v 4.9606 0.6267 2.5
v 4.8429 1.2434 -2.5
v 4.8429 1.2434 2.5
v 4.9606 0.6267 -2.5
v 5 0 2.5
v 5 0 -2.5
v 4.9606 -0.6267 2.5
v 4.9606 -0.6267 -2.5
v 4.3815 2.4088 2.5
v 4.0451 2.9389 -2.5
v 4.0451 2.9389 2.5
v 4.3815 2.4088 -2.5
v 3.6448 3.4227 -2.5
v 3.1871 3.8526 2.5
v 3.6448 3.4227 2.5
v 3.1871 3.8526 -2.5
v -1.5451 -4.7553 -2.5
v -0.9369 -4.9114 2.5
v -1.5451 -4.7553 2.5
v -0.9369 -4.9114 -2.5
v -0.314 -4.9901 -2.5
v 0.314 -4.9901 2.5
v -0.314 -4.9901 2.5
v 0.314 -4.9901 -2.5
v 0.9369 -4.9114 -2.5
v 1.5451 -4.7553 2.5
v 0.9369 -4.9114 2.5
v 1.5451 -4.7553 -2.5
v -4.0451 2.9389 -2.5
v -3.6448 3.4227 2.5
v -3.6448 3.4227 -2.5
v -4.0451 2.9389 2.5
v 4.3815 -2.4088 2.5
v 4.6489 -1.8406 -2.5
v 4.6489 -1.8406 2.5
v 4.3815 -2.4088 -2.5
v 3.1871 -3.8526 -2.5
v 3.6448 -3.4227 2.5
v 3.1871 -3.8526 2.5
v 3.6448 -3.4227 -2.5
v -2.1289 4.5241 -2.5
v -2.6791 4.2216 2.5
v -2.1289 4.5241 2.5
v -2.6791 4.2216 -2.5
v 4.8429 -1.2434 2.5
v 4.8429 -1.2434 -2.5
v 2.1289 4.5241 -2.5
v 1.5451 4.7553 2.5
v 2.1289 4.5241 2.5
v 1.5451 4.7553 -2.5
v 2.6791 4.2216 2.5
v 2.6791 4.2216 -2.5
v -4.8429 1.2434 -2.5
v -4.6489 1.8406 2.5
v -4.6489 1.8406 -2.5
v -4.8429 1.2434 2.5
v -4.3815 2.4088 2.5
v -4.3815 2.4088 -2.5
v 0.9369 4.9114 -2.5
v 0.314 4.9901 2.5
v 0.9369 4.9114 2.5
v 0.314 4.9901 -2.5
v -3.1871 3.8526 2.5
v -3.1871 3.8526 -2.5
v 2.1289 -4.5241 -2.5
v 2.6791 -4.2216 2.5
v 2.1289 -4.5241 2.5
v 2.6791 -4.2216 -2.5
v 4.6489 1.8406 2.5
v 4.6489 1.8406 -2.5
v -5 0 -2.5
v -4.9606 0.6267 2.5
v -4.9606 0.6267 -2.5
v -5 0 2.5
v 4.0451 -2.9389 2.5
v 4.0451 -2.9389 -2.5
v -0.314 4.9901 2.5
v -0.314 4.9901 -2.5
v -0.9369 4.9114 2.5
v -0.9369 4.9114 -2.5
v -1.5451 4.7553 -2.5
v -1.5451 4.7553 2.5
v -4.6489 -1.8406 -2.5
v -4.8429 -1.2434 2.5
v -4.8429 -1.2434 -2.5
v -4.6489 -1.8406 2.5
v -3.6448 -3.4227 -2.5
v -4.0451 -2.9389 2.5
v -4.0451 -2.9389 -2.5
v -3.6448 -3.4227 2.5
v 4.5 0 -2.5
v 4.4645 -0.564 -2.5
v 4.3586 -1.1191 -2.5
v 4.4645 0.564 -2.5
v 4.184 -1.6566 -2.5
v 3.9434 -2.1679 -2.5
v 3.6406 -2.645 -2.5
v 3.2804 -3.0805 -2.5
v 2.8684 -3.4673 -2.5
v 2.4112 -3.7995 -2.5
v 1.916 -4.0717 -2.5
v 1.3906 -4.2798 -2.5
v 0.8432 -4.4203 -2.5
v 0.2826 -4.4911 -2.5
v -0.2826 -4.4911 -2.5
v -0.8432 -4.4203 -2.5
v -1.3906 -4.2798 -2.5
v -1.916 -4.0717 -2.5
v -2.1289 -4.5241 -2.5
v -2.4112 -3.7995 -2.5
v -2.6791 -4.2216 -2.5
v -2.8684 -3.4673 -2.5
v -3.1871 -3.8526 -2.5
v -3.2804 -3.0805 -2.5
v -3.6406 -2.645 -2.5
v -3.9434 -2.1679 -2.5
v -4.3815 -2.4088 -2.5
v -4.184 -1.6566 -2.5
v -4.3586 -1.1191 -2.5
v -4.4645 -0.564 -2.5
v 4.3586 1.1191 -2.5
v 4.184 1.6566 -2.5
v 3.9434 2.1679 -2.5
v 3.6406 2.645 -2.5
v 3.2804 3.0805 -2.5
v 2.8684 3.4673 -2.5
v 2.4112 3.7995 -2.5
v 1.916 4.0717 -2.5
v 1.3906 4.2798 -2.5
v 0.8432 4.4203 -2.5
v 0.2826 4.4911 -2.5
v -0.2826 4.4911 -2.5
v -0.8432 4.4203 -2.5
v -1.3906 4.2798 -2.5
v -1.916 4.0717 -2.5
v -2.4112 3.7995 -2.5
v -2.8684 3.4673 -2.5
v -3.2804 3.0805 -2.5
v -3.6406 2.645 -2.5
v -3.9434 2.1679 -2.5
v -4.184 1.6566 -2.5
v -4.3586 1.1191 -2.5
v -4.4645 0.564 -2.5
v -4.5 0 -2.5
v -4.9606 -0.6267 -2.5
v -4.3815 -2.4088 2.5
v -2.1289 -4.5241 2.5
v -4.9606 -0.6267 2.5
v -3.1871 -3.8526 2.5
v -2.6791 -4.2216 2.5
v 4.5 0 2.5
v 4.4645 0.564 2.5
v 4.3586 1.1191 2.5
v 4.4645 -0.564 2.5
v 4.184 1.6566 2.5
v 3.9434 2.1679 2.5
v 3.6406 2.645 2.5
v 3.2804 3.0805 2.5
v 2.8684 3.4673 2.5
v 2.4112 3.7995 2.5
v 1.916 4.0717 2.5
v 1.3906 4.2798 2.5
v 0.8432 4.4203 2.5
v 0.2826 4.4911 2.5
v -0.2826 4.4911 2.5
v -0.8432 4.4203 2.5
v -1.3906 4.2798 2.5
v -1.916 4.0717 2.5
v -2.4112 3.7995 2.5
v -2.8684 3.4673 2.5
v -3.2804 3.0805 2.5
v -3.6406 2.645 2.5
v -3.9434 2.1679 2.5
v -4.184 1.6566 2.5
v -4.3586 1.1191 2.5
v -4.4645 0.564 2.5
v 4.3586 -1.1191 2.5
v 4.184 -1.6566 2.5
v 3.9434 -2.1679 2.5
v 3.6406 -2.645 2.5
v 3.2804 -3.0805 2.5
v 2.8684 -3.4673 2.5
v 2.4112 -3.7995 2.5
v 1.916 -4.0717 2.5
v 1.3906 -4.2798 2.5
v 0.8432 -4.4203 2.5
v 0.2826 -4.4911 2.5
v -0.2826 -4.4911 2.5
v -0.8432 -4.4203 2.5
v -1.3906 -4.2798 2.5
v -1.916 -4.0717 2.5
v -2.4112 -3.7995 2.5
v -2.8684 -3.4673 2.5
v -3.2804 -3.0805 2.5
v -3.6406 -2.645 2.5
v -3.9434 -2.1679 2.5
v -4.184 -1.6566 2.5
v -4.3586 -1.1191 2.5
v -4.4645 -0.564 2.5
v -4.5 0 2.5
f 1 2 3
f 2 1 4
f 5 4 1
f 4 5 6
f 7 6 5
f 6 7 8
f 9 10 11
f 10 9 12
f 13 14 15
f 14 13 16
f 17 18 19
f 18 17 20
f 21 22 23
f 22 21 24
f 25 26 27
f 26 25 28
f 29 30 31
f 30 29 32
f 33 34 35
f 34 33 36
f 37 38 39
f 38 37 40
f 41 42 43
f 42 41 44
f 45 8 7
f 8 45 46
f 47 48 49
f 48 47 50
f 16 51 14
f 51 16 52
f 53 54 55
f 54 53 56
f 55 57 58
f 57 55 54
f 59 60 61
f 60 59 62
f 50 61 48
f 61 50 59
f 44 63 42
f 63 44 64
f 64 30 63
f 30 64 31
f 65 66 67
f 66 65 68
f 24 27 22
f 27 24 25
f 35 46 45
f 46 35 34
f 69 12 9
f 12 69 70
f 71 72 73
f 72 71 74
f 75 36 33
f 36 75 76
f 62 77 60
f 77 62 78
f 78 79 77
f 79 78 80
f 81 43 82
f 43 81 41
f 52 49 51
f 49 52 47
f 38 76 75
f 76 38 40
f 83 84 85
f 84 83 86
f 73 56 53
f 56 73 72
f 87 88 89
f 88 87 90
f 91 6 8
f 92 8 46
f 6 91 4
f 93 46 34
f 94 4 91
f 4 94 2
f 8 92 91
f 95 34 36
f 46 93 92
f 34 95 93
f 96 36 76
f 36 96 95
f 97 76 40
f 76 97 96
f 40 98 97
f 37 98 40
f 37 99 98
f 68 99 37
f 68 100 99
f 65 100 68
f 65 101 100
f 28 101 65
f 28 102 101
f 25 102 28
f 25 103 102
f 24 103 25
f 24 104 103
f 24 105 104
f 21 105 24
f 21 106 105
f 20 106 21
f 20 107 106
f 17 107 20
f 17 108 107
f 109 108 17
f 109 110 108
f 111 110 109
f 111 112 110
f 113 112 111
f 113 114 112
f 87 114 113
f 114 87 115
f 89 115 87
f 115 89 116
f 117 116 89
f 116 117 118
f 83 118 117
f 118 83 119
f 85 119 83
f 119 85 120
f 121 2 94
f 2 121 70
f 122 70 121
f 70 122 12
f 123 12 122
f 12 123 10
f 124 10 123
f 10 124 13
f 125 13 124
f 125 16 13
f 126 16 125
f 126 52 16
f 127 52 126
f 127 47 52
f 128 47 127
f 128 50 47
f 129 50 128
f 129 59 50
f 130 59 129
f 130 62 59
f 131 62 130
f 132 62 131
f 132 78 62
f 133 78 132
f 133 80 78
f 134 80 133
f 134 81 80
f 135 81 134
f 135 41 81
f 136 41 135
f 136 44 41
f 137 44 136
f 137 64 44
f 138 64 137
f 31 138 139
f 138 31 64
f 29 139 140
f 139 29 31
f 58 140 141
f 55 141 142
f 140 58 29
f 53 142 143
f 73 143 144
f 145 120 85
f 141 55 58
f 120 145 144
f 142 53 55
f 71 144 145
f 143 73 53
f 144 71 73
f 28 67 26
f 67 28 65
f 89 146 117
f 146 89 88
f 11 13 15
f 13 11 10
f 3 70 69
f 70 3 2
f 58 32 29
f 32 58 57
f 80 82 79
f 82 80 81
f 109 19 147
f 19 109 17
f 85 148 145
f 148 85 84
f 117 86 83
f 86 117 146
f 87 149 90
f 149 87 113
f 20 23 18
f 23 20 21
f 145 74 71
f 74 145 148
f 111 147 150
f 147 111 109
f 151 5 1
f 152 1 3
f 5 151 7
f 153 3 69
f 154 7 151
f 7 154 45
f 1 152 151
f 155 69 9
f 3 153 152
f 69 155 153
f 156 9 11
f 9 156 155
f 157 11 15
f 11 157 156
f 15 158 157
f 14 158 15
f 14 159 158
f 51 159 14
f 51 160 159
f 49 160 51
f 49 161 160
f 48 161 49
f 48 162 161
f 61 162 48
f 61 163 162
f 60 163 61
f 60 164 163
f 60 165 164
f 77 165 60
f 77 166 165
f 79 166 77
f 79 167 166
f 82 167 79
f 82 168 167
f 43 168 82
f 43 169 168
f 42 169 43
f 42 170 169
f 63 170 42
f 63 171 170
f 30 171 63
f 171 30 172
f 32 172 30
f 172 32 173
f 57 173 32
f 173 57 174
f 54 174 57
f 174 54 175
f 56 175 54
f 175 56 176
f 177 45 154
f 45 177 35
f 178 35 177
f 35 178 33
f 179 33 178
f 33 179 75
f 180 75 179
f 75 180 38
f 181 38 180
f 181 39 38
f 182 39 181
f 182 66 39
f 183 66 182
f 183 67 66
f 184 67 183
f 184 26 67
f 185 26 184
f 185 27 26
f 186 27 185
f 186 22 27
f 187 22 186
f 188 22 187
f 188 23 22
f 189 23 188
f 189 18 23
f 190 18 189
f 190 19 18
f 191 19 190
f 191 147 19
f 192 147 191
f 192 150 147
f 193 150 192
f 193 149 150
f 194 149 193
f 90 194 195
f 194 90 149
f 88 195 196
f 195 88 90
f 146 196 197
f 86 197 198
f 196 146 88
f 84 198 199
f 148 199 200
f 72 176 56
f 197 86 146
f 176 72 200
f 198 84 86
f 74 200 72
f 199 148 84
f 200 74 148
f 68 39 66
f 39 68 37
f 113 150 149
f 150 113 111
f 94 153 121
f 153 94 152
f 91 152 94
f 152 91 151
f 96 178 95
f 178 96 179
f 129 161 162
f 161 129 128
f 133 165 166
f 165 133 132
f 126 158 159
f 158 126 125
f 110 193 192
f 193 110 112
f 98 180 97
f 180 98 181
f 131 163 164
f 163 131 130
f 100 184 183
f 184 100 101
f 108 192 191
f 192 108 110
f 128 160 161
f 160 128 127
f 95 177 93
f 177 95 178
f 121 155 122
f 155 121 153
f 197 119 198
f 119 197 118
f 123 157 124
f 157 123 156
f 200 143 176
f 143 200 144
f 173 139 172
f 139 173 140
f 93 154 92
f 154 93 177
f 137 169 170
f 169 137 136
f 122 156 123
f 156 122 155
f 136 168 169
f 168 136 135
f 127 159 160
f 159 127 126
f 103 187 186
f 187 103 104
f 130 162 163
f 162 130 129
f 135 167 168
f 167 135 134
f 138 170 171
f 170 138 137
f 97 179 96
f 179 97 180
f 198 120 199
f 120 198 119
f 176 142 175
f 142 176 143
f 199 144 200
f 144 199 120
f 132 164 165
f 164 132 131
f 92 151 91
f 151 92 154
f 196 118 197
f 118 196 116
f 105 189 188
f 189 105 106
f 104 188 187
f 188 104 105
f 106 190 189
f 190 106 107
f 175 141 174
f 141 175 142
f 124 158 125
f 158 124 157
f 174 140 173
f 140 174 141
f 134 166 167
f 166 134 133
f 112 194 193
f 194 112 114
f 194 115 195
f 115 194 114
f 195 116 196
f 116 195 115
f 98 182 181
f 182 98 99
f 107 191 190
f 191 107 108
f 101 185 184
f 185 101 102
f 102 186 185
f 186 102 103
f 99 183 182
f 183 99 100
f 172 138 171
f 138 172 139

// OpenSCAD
$fn = 50;


difference() {
	union() {
		translate(v = [0, 0, -2.5000000000]) {
			cylinder(h = 5, r = 5.0000000000);
		}
	}
	union() {
		translate(v = [0, 0, -100.0000000000]) {
			cylinder(h = 200, r = 4.5000000000);
		}
	}
}
